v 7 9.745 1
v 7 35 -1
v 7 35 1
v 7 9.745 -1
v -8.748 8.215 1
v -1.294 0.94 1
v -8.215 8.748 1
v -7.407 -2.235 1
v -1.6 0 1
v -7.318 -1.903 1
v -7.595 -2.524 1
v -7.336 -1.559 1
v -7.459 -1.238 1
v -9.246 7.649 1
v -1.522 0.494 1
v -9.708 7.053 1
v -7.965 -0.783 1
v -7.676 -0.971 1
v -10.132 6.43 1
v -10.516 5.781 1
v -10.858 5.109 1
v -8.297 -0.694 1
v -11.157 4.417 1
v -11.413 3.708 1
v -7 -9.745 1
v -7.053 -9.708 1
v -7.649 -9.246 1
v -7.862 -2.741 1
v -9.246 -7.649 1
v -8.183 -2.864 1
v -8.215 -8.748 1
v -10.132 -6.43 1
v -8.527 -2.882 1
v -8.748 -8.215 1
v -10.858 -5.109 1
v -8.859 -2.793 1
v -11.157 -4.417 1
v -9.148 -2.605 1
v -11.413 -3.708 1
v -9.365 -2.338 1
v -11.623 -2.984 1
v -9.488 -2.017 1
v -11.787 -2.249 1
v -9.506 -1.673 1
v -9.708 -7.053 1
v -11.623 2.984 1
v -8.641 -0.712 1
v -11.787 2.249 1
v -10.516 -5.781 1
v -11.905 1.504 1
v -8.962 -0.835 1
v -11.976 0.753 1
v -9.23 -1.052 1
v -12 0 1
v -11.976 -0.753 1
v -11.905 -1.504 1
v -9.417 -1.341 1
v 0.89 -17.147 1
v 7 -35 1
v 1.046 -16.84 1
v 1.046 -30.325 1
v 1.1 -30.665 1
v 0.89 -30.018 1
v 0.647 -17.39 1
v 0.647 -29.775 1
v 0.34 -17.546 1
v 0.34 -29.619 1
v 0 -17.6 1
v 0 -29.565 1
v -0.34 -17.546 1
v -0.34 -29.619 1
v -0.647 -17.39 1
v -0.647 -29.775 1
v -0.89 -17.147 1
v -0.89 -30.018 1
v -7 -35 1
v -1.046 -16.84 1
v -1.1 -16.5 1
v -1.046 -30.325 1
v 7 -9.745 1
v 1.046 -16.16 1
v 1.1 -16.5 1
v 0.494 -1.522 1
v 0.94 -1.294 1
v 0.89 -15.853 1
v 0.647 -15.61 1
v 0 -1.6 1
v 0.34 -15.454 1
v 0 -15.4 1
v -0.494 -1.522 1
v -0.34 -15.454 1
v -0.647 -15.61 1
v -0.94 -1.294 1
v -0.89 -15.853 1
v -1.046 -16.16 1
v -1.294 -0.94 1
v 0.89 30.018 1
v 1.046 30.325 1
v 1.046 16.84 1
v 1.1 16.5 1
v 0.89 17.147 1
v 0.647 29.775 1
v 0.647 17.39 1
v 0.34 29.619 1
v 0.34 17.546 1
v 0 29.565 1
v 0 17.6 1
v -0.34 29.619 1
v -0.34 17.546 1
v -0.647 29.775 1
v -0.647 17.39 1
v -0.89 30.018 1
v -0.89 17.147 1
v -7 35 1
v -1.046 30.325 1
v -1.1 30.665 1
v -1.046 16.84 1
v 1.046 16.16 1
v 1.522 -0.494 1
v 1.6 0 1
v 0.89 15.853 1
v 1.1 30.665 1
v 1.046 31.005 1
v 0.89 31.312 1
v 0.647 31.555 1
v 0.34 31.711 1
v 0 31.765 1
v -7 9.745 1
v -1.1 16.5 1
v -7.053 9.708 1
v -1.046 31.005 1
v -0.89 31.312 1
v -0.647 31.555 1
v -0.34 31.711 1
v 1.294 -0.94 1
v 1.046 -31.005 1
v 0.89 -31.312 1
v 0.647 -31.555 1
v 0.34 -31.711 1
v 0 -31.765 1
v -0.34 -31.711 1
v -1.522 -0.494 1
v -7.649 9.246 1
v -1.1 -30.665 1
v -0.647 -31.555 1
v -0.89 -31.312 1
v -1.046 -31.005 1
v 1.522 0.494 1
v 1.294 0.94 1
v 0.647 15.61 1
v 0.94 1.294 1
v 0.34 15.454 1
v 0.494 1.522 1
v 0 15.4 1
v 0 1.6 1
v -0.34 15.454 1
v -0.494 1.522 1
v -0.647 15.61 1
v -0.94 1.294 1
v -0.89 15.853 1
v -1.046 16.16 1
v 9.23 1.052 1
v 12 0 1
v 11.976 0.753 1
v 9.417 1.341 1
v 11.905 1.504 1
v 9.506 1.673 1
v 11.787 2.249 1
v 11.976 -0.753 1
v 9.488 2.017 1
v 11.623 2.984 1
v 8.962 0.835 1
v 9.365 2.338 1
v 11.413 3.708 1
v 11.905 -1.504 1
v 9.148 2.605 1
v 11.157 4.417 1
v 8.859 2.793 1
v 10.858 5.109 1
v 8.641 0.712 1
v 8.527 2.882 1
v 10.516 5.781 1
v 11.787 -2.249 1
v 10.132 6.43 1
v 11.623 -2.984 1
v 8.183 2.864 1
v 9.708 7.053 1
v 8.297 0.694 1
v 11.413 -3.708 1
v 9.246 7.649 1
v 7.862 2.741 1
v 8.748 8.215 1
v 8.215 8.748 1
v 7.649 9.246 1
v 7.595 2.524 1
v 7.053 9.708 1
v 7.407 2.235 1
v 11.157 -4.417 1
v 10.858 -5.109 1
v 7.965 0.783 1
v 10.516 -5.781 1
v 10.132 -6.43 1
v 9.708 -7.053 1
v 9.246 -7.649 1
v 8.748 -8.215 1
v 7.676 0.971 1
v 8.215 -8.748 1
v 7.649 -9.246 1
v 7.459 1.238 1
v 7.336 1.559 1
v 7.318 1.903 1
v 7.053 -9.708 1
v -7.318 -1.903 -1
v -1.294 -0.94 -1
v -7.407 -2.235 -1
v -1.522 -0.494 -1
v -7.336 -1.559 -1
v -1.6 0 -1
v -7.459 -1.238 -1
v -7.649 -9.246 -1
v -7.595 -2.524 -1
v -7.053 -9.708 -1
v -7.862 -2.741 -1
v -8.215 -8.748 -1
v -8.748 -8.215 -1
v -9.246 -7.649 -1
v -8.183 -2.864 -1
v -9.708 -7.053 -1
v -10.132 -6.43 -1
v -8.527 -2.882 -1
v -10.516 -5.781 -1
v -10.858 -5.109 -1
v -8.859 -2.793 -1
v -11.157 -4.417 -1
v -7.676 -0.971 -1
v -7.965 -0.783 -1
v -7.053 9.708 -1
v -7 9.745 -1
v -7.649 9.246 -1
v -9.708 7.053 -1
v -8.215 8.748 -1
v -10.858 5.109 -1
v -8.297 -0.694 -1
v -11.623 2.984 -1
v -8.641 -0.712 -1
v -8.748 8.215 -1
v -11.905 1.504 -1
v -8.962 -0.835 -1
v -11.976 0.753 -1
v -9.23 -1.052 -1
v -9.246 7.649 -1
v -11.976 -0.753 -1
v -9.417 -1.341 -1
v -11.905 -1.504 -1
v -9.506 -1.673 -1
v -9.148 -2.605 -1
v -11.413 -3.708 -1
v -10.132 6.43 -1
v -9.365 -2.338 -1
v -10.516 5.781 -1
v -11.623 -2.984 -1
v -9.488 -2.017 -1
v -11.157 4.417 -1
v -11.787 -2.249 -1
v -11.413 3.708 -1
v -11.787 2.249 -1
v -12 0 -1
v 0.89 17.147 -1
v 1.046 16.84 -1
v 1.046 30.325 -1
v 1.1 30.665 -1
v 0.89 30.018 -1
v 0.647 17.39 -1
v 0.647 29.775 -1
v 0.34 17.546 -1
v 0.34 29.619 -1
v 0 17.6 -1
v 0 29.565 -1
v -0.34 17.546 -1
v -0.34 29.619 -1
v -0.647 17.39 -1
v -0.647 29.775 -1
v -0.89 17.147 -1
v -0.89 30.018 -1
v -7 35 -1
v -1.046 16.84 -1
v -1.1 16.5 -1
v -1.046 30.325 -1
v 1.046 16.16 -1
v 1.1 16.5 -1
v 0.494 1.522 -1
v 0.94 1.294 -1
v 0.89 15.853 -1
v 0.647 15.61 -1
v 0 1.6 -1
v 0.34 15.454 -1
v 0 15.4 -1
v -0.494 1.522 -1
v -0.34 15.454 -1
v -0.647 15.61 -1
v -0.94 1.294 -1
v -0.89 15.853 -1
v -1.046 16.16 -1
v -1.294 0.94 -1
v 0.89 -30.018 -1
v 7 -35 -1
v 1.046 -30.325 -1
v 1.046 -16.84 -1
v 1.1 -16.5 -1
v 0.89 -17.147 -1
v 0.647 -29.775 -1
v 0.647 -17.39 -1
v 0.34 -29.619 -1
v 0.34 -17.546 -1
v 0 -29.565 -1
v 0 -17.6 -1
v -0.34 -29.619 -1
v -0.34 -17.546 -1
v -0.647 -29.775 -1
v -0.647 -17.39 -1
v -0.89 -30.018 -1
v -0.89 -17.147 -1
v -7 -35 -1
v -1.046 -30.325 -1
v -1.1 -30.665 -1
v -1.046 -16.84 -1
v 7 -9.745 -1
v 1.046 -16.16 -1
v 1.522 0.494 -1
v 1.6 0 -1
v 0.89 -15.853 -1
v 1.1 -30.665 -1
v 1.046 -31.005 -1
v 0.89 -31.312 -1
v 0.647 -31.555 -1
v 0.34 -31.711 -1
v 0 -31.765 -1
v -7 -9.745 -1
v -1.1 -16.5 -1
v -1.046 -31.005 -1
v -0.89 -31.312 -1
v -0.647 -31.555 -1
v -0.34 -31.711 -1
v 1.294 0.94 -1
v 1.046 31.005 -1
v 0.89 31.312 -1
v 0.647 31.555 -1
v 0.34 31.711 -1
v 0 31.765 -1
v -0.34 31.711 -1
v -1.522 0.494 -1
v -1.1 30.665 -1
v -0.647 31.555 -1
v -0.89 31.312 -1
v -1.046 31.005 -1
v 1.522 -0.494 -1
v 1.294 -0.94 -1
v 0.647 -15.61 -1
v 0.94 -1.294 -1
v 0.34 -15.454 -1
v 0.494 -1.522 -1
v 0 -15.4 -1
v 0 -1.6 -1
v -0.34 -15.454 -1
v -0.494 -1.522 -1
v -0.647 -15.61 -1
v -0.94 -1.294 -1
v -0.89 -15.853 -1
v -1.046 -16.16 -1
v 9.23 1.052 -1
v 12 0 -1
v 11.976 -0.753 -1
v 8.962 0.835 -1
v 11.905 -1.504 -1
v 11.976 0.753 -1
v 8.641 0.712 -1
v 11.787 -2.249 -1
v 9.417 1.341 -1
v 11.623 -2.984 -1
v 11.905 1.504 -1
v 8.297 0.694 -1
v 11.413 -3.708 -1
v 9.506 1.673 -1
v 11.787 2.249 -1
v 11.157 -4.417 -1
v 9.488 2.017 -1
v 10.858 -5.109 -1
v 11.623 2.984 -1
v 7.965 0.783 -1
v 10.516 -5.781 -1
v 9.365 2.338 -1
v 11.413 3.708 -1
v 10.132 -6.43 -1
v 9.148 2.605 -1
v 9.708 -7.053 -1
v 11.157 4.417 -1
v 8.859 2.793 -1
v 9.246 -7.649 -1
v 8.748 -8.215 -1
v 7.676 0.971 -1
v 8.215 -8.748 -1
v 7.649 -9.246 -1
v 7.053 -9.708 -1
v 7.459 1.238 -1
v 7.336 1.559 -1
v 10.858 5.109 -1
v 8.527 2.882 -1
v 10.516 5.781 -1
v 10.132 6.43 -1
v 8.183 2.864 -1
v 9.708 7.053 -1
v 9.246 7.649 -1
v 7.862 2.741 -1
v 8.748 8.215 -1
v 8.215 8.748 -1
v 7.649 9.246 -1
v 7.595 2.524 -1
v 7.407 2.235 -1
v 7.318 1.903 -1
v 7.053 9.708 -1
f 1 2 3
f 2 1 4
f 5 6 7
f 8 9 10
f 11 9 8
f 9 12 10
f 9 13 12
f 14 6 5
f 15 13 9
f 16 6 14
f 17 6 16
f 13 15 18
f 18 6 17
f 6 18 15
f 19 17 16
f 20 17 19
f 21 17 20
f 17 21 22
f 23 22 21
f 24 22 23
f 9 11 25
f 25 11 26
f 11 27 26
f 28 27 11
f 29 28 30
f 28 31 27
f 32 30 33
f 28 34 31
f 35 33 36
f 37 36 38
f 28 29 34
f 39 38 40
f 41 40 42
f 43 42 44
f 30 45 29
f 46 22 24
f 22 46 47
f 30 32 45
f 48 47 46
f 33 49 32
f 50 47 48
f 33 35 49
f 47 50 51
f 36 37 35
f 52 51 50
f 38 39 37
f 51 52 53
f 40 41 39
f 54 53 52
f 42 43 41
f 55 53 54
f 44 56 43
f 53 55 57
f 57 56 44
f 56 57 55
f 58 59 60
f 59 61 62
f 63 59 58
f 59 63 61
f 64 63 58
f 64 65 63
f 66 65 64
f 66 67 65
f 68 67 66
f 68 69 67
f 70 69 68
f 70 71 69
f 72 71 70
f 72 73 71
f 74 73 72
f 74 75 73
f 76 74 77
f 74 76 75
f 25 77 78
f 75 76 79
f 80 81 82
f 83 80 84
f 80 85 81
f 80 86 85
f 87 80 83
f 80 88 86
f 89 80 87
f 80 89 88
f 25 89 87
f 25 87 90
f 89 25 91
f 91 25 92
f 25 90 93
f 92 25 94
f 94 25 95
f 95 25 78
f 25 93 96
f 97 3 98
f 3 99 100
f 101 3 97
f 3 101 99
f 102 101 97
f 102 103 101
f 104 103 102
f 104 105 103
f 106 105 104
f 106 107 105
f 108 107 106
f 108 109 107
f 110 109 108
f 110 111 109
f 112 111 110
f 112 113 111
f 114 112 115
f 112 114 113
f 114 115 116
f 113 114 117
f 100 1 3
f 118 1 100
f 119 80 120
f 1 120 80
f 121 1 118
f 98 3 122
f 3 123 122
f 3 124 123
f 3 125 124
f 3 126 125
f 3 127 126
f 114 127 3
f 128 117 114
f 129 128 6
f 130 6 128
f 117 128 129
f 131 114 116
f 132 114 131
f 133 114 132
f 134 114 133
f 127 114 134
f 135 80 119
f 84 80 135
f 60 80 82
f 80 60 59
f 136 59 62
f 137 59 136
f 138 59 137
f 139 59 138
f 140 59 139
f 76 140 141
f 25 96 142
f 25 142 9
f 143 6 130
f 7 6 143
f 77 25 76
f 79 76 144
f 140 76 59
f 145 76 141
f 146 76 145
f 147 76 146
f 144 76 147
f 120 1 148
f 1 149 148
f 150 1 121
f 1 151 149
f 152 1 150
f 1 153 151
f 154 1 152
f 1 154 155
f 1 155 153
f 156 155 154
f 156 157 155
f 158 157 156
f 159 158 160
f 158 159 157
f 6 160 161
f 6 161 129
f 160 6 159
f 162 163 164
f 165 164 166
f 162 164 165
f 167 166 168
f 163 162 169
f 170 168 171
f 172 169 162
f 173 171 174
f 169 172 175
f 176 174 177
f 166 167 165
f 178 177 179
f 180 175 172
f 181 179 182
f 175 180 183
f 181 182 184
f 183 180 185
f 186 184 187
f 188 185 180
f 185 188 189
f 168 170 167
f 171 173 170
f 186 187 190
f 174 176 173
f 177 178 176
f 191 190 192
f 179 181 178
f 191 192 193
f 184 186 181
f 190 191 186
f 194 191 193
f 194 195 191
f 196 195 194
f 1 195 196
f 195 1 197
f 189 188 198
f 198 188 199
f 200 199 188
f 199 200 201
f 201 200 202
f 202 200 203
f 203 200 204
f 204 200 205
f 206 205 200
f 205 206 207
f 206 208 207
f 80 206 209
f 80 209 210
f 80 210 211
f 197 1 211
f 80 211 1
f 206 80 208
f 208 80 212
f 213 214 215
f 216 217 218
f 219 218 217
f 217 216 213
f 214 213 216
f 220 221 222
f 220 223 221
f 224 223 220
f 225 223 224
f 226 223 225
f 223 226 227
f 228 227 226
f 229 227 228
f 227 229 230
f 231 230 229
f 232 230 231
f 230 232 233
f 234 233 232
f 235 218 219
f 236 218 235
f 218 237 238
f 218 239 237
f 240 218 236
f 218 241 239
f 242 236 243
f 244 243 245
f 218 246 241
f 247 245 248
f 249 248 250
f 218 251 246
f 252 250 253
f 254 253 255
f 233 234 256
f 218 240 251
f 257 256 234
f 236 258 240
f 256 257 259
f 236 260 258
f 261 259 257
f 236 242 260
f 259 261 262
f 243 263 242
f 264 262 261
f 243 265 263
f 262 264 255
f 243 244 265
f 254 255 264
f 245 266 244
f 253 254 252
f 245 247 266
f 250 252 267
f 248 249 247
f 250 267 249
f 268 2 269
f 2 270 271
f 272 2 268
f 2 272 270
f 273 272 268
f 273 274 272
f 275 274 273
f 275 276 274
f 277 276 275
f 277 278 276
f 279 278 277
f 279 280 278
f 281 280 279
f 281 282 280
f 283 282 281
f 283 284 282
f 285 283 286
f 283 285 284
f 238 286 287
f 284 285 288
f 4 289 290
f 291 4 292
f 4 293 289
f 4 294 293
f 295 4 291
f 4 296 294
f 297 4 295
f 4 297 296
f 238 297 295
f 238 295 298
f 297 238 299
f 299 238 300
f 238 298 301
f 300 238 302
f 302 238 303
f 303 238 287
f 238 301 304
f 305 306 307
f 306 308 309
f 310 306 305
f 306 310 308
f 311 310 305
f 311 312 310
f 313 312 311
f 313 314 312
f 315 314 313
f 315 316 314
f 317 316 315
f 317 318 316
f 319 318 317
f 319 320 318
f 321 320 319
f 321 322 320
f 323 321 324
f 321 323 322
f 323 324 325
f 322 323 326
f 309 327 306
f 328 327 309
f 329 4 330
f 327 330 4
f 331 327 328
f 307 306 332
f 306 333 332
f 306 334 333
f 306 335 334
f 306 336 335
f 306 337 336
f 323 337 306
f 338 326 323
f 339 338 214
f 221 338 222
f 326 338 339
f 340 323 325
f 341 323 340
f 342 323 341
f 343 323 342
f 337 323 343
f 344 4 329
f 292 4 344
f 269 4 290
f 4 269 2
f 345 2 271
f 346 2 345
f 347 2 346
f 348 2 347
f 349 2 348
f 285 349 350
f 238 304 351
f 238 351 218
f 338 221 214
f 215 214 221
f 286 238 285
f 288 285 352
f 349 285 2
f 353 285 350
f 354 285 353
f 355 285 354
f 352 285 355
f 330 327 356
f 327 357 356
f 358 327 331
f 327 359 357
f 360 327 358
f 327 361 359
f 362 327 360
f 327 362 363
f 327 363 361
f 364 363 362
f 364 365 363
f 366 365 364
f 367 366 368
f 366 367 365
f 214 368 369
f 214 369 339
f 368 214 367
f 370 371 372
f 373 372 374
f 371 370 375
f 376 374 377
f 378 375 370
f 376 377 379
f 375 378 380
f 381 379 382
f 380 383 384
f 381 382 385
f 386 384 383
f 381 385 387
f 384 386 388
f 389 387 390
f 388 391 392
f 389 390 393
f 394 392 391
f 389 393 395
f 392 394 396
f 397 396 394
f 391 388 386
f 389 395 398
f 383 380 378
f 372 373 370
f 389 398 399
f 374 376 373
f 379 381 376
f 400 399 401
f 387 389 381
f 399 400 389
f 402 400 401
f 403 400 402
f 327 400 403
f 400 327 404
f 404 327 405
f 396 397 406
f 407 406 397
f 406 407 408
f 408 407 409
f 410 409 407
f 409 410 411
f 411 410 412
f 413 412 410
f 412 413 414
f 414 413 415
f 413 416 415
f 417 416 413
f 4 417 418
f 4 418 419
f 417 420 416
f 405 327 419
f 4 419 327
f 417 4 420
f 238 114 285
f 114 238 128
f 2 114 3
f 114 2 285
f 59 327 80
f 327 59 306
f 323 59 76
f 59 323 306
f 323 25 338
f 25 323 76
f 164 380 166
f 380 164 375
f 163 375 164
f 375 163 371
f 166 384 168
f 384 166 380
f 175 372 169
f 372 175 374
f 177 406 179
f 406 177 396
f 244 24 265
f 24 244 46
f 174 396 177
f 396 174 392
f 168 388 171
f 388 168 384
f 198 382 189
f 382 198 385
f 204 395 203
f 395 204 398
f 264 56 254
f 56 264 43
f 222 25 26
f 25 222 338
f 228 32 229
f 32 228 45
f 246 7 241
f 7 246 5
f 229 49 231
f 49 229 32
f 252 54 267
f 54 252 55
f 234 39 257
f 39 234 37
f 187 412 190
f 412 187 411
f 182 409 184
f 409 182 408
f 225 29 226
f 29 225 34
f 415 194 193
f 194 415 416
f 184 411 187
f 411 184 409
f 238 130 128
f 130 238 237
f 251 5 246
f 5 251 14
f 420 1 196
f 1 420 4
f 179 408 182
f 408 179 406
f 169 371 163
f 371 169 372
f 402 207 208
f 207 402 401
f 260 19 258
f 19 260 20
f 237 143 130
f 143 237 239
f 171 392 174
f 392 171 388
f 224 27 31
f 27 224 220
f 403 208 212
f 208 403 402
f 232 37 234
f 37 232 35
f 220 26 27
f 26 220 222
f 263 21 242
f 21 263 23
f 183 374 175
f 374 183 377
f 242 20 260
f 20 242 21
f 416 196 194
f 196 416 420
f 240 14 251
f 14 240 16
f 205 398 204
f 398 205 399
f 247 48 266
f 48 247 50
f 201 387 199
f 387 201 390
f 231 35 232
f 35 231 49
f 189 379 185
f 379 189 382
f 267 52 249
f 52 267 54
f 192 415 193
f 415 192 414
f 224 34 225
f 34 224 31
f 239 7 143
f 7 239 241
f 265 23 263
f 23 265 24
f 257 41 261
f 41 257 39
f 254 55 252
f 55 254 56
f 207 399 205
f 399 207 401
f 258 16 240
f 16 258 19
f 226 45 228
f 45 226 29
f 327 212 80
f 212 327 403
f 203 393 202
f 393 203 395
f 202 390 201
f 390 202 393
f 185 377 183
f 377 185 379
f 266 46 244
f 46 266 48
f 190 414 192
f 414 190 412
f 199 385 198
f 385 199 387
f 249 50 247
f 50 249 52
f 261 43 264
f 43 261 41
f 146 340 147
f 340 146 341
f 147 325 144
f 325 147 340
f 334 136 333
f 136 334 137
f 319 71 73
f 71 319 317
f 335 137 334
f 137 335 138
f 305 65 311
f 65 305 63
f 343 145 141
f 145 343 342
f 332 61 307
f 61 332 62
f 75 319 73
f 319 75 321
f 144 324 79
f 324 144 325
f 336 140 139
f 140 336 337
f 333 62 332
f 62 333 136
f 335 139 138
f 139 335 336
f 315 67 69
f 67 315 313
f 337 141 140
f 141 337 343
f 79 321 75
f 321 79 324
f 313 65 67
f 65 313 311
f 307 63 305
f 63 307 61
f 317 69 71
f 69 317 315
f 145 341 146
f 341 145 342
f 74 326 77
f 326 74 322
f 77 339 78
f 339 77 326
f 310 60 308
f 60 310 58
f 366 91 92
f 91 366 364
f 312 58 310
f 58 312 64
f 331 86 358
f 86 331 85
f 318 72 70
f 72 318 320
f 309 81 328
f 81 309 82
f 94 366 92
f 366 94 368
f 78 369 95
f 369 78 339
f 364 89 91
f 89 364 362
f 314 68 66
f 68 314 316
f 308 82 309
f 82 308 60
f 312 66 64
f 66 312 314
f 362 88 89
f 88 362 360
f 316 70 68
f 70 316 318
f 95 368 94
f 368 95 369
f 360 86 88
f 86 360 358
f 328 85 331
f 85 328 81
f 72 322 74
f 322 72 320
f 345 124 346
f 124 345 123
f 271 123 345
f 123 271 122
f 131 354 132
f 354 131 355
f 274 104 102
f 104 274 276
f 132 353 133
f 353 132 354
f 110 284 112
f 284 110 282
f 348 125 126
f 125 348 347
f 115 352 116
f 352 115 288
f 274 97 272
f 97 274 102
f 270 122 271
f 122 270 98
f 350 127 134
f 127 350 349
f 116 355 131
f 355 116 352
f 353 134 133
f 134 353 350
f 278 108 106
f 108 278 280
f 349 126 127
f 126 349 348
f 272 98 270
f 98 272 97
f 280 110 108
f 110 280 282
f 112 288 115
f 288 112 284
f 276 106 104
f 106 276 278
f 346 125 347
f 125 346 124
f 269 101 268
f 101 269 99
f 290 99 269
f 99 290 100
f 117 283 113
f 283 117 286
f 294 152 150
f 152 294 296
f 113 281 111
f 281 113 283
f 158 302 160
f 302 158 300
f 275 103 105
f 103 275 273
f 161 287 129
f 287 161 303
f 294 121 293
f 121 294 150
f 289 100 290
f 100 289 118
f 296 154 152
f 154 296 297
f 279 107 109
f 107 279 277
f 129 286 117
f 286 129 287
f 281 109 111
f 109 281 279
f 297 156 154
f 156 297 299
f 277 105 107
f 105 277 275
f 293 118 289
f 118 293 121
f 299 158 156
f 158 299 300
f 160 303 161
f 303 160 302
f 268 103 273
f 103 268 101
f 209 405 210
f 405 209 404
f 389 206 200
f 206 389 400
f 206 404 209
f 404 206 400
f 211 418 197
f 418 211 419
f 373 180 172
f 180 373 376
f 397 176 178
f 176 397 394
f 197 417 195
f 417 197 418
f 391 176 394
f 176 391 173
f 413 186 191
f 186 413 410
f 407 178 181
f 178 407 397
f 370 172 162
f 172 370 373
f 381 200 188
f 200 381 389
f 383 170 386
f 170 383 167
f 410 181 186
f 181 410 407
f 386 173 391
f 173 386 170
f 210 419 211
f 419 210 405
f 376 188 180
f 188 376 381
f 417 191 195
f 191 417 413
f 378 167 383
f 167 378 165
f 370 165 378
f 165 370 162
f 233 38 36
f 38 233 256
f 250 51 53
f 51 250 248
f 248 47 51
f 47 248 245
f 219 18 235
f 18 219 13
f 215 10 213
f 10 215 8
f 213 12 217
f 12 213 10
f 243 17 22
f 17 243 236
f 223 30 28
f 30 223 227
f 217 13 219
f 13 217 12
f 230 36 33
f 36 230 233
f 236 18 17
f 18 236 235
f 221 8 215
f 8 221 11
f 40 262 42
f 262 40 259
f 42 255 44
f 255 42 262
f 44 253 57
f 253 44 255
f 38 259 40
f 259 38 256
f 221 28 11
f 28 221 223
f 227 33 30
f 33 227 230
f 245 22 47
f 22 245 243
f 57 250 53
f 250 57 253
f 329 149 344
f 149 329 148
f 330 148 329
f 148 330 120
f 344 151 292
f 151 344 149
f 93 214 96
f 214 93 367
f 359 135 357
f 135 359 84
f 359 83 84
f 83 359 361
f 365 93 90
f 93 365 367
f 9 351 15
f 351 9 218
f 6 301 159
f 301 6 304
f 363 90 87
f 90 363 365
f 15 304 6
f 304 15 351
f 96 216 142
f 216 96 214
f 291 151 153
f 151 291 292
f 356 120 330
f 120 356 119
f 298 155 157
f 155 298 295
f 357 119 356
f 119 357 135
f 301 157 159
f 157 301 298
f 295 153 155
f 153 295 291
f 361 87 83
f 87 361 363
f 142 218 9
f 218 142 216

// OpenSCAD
// file: ../../parameters.scad
global_clearance = 0.5;


//Main tube diameter - hole [mm]
main_tube_outer_diameter = 25.4;
main_tube_inner_diameter = 23.05;

// Nastavení parametrů rotoru

gliding_aggle = 14;         // tenhle úhel by se zřejmě v budoucnu měl počítat z požadované klouzavosti.

rotor_blade_AOA = 1.5;      // nastavení úhlu náběhu rotorového listu
rotor_blade_length = 970;   // délka rotorového listu
rotor_blade_depth = 50;     // hloubka rotorového listu
rotor_height = 180;         // výška otočného kloubu rotoru nad hlavní trubkou vírníku (odhad)
rotor_blades_count = 2;
rotor_delta_angle = 12;


rotor_head_width =  21.4;    //Rozměr 1 v nákresu
pilon_wall_thickness = 4.2;  // Rozměr 2 v nákresu
horizontal_screw_distance = 14.5;   // Rozměr 4 v nákresu
vertical_screw_distance = 12;       // rozměr 5 v nkresu

rotorhead_wall_thickness = 2; // sila tistenych dilu


bearing_outer_diameter = 7.1;    // Rozměr B1 v nákresu s přídavkem na toleranci otvoru
bearing_thickness = 3.1;        // Rozměr B2 v nákresu
bearing_shaft_length = 19.5;    // Rozměr B3 v nákresu


// nastavení parametrů motoru

engine_angle = -8;
engine_diameter = 55;
engine_offset = 55;

engine_screws_radius = 15;
engine_holes_radius = (24 + 44)/4;
engine_shatf_hole_diameter = 13;

// screw length step - minimum difference in length between two types of screws
basic_screw_length = 5;

//Screw diameter and nut for M5 [mm]
M5_screw_diameter=5.5;
M5_head_height = 5;
M5_head_diameter = 13+0.5;
M5_nut_height = 4.5;
M5_nut_diameter = 9.4;
M5_nut_pocket = 8.4;

//Screw diameter and nut for M4 [mm]
M4_screw_diameter=4.5;
M4_screw_head_height = 4;
M4_nut_height = 3.2;
M4_nut_diameter = 8.4;
M4_nut_pocket = 7.5;

//Screw diameter and nut for M3 [mm]
M3_screw_diameter = 3.2;
M3_nut_height = 2.7;
M3_nut_diameter = 6.6;
M3_screw_head_height = 3;
M3_nut_pocket = 5.6;


//Screw diameter and nut for M2,5 [mm]
M2_5_screw_diameter = 2.7;
M2_5_nut_height = 2.3;
M2_5_nut_diameter = 6;
M2_5_nut_pocket = 5.1;

//Screw diameter and nut for M2 [mm]
M2_screw_diameter = 2.2;
M2_nut_height = 1.8;
M2_nut_diameter = 4.5;
M2_nut_pocket = 3.95;



//šroub servo
Servo_screw = 1.5;
Servo_nut_height = 1;
Servo_nut_diameter = 2.7;



//center_of_gravity_position = [main_pilon_position - tan(gliding_aggle)*rotor_height, 0, 0];


////podzvozek

radius_undercarriage = 25;
vzdalenost_x = tan(20) * 131;
vzdalenost_y = (131 - radius_undercarriage)/tan(79);
uhel_y = 90 - 20;
uhel_x = 90 - 79;

maximum_printable_size = 150;


////Pitotova trubice
Pitot_tube_diameter = 4.02 + 1;
Distance_hole_from_tube = 11.92;  //vzdálenost otvoru pro připevnění od samotné trubičky
// file: ../888_1001.scad
//
//
//

include <../parameters.scad>

module 888_1001()
{
    angle_between_blades = 360 / rotor_blades_count;
    rotor_center_plate_size = 30;
    rotor_mounting_plate_size = 20;
    shaft_diameter = M3_screw_diameter;
    thickness = 2;
    blade_screws_distance = (16.47+11.86)/2;

    difference () {
        union () {
            cylinder(r = 3+9, h = thickness, center = true, $fn = 100);

            for (i = [0:rotor_blades_count]){
                rotate([0,0, i*angle_between_blades])
                    translate([0, 20, 0])
                        cube([14, 30, thickness], center = true);
            }
        }

        cylinder(d = shaft_diameter, h = 2* thickness, center = true, $fn = 20);


        for (i = [1:rotor_blades_count]){
            rotate([0,0, i*angle_between_blades])
                translate([0, 16.5 + blade_screws_distance/2, 0]) {
                    translate([0, blade_screws_distance/2, 0])
                        cylinder(d = M2_screw_diameter, h = 2* thickness, center = true, $fn = 20);
                    translate([0, -blade_screws_distance/2, 0])
                        cylinder(d = M2_screw_diameter, h = 2* thickness, center = true, $fn = 20);
                }
        }

        rotate([0,0, rotor_delta_angle])
        for (i = [1:rotor_blades_count]){
            rotate([0,0, i*angle_between_blades + angle_between_blades/2])
                translate([0, 3 + 4.5 + M2_screw_diameter/2, 0])
                    cylinder(d = M2_screw_diameter, h = 2* thickness, center = true, $fn = 20);
        }
    }
}

888_1001();
// main file
//
//
//

use <../888_1001.scad>

888_1001(hole_diameter=2.5);
